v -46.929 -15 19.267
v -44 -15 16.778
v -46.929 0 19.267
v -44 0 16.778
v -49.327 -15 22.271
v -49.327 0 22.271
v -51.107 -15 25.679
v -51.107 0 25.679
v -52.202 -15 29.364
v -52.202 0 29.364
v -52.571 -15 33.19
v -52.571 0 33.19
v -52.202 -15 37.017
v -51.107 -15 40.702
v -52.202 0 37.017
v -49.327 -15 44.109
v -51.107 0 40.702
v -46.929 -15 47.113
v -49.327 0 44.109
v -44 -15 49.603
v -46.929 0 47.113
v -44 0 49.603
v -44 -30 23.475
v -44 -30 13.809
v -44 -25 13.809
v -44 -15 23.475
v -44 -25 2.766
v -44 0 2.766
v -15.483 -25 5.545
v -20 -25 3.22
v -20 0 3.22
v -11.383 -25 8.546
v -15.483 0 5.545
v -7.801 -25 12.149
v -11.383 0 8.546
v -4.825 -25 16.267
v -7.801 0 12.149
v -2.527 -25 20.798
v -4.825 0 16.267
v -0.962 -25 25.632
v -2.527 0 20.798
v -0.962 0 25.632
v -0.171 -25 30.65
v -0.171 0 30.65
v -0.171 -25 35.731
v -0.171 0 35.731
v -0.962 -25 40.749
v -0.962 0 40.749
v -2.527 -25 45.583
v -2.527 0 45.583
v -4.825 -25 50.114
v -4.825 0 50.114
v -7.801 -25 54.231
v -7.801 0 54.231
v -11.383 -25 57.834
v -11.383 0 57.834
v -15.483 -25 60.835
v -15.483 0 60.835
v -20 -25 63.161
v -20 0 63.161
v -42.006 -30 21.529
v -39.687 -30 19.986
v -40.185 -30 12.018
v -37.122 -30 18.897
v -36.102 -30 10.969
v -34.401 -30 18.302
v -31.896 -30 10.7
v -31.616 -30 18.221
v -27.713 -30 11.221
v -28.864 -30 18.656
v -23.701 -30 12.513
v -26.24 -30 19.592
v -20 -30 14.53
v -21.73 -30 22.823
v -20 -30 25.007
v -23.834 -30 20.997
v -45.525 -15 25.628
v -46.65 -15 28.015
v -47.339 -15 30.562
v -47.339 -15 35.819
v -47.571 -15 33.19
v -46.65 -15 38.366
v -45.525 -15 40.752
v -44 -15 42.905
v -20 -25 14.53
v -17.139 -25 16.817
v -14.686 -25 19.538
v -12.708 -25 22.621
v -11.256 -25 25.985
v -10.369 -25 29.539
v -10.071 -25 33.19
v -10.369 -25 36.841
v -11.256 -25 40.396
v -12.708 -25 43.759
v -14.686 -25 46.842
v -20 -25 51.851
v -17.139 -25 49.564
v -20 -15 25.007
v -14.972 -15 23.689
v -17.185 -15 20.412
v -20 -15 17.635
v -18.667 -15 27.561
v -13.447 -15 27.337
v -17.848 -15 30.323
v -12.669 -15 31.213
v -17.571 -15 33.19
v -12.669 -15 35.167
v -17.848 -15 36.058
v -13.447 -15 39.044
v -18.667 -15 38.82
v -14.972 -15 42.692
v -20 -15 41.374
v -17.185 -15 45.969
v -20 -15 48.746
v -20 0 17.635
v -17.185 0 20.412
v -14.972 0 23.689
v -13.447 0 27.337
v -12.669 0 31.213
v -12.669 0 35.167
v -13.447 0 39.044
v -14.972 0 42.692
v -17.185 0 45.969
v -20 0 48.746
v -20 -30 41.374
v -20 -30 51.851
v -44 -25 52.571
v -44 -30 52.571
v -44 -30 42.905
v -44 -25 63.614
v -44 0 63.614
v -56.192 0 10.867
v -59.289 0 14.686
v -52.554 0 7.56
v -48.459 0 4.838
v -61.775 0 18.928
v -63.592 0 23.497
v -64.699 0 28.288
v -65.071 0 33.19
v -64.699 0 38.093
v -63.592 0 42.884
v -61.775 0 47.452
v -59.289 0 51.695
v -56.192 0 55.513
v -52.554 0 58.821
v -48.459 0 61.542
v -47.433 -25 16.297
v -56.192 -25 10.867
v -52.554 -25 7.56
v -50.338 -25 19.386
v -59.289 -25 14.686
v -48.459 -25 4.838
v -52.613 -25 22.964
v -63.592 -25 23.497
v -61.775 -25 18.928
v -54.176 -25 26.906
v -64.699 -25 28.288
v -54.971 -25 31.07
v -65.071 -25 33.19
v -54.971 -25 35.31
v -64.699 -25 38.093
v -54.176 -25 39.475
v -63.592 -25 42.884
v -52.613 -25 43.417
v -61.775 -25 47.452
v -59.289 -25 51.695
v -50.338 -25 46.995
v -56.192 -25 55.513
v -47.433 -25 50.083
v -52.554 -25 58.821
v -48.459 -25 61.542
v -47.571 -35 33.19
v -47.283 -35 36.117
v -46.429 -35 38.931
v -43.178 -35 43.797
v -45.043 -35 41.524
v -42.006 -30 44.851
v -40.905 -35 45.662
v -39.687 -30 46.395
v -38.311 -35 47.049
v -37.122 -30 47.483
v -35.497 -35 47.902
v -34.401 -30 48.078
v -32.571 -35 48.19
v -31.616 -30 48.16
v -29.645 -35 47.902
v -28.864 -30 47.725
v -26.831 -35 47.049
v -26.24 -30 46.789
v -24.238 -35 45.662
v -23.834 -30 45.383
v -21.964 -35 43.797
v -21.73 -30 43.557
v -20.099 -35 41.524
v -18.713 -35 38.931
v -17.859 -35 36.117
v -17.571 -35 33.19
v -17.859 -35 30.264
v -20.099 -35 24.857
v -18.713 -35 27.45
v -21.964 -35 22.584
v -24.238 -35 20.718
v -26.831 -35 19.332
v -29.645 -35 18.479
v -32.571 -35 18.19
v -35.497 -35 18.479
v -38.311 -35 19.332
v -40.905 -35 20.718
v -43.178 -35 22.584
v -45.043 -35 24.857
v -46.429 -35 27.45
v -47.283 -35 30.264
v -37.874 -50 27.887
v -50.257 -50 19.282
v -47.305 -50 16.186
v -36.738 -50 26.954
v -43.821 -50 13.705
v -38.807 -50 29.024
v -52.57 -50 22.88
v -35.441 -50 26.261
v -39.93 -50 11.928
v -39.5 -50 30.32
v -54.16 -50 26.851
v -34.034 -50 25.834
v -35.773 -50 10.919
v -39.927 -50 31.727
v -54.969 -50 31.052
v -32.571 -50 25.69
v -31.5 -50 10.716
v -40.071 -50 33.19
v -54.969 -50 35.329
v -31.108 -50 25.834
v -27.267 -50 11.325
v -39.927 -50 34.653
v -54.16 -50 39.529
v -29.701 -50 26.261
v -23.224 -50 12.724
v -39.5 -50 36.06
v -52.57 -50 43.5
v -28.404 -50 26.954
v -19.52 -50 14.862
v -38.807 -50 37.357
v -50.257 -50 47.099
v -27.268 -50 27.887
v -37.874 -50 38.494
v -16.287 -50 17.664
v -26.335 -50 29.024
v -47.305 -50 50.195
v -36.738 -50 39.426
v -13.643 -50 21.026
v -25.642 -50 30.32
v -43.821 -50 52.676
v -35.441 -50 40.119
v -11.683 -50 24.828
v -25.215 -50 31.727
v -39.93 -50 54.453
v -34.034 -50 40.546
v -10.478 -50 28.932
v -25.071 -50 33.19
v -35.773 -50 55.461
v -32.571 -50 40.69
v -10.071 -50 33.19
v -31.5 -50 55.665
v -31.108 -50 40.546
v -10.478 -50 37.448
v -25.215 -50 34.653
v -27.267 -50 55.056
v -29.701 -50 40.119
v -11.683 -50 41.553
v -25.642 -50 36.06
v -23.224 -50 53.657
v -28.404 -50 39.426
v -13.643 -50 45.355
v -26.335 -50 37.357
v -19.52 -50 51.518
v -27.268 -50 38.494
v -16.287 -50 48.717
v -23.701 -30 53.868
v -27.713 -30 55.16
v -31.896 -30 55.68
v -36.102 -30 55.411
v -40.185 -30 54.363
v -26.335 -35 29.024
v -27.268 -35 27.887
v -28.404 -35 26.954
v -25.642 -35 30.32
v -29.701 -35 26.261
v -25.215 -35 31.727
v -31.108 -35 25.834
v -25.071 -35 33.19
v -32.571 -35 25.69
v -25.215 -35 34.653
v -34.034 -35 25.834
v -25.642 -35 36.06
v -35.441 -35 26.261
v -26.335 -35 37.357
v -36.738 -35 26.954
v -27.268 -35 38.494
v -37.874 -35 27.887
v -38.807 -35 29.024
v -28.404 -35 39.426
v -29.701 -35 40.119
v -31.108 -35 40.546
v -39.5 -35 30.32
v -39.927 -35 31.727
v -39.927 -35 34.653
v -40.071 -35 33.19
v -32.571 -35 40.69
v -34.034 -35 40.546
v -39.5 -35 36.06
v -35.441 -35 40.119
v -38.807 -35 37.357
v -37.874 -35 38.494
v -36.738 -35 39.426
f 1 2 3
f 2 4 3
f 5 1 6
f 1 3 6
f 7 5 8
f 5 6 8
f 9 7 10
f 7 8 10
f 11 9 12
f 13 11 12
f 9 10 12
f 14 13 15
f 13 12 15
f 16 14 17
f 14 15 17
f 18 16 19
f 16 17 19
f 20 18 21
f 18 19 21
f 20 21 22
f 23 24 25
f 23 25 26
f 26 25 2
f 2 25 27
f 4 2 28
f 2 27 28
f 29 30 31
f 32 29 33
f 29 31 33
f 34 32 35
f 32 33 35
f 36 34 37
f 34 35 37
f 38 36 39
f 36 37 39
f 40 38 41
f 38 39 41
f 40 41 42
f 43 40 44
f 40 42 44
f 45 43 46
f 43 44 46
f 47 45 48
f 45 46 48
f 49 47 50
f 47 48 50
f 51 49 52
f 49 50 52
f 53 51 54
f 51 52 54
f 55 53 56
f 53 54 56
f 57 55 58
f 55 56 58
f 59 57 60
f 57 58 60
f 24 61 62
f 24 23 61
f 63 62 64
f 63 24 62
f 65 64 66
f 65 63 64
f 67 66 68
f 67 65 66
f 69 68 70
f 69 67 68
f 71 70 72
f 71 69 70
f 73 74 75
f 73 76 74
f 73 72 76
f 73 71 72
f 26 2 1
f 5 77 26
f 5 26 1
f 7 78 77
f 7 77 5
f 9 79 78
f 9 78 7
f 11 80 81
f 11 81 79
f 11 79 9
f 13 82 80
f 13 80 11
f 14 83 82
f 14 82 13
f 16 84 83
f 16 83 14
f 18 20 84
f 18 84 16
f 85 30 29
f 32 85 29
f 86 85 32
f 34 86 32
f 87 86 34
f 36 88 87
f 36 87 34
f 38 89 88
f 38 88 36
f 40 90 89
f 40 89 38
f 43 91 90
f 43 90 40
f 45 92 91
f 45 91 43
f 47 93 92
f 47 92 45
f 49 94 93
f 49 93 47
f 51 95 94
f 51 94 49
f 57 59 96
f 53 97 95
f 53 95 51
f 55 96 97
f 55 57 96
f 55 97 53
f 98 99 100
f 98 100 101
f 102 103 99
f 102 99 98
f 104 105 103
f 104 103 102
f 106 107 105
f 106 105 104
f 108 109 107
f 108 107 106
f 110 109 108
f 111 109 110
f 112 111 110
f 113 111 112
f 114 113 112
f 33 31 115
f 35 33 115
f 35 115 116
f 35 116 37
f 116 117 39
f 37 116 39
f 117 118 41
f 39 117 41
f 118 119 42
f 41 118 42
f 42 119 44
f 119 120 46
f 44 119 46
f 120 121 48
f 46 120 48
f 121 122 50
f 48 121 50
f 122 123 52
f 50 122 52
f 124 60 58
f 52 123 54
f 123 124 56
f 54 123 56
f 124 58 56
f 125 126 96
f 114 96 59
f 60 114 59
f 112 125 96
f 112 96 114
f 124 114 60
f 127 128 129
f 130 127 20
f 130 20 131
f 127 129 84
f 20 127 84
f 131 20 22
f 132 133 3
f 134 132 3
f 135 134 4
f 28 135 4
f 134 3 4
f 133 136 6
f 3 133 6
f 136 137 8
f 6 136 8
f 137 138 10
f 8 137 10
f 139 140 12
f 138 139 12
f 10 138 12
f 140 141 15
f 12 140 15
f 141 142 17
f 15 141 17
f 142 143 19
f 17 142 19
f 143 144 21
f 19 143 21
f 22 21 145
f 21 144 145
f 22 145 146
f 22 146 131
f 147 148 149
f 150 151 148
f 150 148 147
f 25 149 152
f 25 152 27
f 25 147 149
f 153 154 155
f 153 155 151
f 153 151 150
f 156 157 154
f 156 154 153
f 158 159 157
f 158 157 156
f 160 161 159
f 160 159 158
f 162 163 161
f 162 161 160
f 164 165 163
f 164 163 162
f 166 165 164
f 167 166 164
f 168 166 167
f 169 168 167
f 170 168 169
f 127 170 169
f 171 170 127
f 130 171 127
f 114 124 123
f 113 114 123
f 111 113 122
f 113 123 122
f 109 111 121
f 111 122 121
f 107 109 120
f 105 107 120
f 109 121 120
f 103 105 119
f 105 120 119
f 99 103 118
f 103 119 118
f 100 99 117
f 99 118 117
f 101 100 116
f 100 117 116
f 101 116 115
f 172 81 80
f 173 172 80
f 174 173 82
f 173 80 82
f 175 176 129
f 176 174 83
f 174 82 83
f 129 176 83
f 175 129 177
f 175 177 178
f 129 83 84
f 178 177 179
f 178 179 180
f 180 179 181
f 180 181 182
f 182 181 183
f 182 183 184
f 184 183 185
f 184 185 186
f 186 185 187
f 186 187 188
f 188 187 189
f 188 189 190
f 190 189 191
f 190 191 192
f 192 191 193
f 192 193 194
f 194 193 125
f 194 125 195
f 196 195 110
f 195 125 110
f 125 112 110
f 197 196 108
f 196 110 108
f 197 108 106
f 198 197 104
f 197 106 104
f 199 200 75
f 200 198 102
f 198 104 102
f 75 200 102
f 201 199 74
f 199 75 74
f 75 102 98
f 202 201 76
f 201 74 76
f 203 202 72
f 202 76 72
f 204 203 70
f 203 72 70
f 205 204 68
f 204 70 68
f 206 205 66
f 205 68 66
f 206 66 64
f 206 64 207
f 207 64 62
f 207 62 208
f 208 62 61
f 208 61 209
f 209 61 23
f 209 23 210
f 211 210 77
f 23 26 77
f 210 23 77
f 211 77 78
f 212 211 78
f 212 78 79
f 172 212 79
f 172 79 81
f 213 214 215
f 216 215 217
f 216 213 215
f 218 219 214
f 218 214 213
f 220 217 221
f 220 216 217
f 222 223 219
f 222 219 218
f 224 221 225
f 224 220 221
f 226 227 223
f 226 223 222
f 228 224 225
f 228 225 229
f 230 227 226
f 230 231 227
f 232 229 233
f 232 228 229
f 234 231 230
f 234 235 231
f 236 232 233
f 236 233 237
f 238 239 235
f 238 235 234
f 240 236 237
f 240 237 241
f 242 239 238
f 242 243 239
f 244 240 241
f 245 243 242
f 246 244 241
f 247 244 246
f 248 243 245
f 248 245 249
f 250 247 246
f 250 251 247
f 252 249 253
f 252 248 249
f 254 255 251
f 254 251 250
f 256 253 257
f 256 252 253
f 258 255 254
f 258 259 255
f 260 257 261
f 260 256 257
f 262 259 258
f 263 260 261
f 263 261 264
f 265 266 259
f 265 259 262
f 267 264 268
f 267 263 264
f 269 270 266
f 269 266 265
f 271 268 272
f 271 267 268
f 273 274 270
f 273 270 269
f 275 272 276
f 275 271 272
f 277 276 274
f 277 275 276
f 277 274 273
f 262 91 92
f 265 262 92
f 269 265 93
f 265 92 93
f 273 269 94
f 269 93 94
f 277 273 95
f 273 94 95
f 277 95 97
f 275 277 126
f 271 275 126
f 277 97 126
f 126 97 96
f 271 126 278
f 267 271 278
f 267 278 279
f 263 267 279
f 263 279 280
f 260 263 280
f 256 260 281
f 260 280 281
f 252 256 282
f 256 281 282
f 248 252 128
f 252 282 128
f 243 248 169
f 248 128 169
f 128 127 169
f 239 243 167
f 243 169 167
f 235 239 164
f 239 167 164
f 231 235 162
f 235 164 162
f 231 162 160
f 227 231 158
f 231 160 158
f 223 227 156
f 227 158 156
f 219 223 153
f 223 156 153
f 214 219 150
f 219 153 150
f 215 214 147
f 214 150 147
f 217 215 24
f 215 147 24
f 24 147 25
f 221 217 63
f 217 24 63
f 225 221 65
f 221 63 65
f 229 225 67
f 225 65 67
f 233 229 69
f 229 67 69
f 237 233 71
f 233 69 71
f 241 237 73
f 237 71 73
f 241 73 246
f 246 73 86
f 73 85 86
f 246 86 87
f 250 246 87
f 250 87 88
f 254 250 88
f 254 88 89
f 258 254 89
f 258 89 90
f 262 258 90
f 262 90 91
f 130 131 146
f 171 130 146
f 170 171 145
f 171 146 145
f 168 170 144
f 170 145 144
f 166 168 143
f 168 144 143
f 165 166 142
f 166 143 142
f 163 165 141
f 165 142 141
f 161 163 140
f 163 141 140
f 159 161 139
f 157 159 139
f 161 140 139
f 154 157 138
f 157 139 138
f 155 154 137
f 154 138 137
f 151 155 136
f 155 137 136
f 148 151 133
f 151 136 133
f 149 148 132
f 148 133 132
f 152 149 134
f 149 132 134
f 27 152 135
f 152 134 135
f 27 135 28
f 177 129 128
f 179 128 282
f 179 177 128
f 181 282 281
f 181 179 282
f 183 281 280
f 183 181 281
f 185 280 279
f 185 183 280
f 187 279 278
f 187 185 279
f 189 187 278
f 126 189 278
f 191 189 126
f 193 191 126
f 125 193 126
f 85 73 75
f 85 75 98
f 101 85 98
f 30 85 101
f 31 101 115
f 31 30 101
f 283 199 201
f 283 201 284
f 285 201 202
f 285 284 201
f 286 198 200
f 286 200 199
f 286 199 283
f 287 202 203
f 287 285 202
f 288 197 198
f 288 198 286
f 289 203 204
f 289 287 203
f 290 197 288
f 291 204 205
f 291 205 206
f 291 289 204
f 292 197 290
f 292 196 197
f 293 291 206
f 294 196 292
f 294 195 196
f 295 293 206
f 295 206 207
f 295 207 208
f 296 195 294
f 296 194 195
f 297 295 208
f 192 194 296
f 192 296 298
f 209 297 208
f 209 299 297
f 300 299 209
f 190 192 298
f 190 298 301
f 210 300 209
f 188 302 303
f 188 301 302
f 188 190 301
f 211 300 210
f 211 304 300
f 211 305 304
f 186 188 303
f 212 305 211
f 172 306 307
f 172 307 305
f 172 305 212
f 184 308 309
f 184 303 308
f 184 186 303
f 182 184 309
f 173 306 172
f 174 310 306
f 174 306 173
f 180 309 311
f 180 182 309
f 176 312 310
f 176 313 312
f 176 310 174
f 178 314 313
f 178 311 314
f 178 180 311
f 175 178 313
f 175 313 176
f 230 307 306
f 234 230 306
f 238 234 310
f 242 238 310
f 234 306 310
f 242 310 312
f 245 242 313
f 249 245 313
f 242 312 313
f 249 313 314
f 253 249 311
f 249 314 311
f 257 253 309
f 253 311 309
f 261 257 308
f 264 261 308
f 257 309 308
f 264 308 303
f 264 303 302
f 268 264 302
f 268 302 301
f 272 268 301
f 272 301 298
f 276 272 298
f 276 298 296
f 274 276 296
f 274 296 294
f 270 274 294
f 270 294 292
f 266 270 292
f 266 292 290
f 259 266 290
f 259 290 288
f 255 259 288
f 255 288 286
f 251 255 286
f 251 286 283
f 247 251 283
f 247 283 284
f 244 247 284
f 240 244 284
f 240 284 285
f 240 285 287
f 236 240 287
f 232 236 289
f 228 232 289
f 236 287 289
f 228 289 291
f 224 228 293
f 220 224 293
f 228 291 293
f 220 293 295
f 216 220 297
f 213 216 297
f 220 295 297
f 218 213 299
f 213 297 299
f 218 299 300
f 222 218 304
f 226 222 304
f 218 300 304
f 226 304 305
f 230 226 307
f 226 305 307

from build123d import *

# Parameters (mm, degrees)
F0_R      = 32.5
F1_DEPTH  = 25
F2_R      = 22.5
F3_DEPTH  = 25
F4_R      = 20
F5_DEPTH  = 15
F6_R      = 15
F7_DEPTH  = 20
F9_W      = 24
F9_H      = 30
F10_DEPTH = 100
F8_R      = 7.5
F12_DEPTH = 25


with BuildPart() as f1:
    # F0 (on Front) → F1 (new body)
    with BuildSketch(Plane.XZ):
        with Locations((-32.571085, 33.19031)):
            Circle(F0_R)
    extrude(amount=F1_DEPTH)

    # F2 (on face) → F3 (join)
    with BuildSketch(Plane.XZ.offset(25)):
        with Locations((-32.571085, 33.19031)):
            Circle(F2_R)
    extrude(amount=F3_DEPTH)

    # F4 (on face) → F5 (cut)
    with BuildSketch(Plane(origin=(0, 0, 0), x_dir=(-1, 0, 0), z_dir=(0, 1, 0))):
        with Locations((32.571085, 33.19031)):
            Circle(F4_R)
    extrude(amount=-F5_DEPTH, mode=Mode.SUBTRACT)

    # F6 (on face) → F7 (cut)
    with BuildSketch(Plane(origin=(0, -15, 0), x_dir=(-1, 0, 0), z_dir=(0, 1, 0))):
        with Locations((32.571085, 33.19031)):
            Circle(F6_R)
    extrude(amount=-F7_DEPTH, mode=Mode.SUBTRACT)

    # F9 (on Top) → F10 (cut)
    with BuildSketch(Plane.XY):
        with Locations((-32, -15)):
            Rectangle(F9_W, F9_H)
    extrude(amount=F10_DEPTH, mode=Mode.SUBTRACT)

    # F8 (on face) → F12 (cut)
    with BuildSketch(Plane(origin=(0, -35, 0), x_dir=(-1, 0, 0), z_dir=(0, 1, 0))):
        with Locations((32.571085, 33.19031)):
            Circle(F8_R)
    extrude(amount=-F12_DEPTH, mode=Mode.SUBTRACT)


solid = f1.part
